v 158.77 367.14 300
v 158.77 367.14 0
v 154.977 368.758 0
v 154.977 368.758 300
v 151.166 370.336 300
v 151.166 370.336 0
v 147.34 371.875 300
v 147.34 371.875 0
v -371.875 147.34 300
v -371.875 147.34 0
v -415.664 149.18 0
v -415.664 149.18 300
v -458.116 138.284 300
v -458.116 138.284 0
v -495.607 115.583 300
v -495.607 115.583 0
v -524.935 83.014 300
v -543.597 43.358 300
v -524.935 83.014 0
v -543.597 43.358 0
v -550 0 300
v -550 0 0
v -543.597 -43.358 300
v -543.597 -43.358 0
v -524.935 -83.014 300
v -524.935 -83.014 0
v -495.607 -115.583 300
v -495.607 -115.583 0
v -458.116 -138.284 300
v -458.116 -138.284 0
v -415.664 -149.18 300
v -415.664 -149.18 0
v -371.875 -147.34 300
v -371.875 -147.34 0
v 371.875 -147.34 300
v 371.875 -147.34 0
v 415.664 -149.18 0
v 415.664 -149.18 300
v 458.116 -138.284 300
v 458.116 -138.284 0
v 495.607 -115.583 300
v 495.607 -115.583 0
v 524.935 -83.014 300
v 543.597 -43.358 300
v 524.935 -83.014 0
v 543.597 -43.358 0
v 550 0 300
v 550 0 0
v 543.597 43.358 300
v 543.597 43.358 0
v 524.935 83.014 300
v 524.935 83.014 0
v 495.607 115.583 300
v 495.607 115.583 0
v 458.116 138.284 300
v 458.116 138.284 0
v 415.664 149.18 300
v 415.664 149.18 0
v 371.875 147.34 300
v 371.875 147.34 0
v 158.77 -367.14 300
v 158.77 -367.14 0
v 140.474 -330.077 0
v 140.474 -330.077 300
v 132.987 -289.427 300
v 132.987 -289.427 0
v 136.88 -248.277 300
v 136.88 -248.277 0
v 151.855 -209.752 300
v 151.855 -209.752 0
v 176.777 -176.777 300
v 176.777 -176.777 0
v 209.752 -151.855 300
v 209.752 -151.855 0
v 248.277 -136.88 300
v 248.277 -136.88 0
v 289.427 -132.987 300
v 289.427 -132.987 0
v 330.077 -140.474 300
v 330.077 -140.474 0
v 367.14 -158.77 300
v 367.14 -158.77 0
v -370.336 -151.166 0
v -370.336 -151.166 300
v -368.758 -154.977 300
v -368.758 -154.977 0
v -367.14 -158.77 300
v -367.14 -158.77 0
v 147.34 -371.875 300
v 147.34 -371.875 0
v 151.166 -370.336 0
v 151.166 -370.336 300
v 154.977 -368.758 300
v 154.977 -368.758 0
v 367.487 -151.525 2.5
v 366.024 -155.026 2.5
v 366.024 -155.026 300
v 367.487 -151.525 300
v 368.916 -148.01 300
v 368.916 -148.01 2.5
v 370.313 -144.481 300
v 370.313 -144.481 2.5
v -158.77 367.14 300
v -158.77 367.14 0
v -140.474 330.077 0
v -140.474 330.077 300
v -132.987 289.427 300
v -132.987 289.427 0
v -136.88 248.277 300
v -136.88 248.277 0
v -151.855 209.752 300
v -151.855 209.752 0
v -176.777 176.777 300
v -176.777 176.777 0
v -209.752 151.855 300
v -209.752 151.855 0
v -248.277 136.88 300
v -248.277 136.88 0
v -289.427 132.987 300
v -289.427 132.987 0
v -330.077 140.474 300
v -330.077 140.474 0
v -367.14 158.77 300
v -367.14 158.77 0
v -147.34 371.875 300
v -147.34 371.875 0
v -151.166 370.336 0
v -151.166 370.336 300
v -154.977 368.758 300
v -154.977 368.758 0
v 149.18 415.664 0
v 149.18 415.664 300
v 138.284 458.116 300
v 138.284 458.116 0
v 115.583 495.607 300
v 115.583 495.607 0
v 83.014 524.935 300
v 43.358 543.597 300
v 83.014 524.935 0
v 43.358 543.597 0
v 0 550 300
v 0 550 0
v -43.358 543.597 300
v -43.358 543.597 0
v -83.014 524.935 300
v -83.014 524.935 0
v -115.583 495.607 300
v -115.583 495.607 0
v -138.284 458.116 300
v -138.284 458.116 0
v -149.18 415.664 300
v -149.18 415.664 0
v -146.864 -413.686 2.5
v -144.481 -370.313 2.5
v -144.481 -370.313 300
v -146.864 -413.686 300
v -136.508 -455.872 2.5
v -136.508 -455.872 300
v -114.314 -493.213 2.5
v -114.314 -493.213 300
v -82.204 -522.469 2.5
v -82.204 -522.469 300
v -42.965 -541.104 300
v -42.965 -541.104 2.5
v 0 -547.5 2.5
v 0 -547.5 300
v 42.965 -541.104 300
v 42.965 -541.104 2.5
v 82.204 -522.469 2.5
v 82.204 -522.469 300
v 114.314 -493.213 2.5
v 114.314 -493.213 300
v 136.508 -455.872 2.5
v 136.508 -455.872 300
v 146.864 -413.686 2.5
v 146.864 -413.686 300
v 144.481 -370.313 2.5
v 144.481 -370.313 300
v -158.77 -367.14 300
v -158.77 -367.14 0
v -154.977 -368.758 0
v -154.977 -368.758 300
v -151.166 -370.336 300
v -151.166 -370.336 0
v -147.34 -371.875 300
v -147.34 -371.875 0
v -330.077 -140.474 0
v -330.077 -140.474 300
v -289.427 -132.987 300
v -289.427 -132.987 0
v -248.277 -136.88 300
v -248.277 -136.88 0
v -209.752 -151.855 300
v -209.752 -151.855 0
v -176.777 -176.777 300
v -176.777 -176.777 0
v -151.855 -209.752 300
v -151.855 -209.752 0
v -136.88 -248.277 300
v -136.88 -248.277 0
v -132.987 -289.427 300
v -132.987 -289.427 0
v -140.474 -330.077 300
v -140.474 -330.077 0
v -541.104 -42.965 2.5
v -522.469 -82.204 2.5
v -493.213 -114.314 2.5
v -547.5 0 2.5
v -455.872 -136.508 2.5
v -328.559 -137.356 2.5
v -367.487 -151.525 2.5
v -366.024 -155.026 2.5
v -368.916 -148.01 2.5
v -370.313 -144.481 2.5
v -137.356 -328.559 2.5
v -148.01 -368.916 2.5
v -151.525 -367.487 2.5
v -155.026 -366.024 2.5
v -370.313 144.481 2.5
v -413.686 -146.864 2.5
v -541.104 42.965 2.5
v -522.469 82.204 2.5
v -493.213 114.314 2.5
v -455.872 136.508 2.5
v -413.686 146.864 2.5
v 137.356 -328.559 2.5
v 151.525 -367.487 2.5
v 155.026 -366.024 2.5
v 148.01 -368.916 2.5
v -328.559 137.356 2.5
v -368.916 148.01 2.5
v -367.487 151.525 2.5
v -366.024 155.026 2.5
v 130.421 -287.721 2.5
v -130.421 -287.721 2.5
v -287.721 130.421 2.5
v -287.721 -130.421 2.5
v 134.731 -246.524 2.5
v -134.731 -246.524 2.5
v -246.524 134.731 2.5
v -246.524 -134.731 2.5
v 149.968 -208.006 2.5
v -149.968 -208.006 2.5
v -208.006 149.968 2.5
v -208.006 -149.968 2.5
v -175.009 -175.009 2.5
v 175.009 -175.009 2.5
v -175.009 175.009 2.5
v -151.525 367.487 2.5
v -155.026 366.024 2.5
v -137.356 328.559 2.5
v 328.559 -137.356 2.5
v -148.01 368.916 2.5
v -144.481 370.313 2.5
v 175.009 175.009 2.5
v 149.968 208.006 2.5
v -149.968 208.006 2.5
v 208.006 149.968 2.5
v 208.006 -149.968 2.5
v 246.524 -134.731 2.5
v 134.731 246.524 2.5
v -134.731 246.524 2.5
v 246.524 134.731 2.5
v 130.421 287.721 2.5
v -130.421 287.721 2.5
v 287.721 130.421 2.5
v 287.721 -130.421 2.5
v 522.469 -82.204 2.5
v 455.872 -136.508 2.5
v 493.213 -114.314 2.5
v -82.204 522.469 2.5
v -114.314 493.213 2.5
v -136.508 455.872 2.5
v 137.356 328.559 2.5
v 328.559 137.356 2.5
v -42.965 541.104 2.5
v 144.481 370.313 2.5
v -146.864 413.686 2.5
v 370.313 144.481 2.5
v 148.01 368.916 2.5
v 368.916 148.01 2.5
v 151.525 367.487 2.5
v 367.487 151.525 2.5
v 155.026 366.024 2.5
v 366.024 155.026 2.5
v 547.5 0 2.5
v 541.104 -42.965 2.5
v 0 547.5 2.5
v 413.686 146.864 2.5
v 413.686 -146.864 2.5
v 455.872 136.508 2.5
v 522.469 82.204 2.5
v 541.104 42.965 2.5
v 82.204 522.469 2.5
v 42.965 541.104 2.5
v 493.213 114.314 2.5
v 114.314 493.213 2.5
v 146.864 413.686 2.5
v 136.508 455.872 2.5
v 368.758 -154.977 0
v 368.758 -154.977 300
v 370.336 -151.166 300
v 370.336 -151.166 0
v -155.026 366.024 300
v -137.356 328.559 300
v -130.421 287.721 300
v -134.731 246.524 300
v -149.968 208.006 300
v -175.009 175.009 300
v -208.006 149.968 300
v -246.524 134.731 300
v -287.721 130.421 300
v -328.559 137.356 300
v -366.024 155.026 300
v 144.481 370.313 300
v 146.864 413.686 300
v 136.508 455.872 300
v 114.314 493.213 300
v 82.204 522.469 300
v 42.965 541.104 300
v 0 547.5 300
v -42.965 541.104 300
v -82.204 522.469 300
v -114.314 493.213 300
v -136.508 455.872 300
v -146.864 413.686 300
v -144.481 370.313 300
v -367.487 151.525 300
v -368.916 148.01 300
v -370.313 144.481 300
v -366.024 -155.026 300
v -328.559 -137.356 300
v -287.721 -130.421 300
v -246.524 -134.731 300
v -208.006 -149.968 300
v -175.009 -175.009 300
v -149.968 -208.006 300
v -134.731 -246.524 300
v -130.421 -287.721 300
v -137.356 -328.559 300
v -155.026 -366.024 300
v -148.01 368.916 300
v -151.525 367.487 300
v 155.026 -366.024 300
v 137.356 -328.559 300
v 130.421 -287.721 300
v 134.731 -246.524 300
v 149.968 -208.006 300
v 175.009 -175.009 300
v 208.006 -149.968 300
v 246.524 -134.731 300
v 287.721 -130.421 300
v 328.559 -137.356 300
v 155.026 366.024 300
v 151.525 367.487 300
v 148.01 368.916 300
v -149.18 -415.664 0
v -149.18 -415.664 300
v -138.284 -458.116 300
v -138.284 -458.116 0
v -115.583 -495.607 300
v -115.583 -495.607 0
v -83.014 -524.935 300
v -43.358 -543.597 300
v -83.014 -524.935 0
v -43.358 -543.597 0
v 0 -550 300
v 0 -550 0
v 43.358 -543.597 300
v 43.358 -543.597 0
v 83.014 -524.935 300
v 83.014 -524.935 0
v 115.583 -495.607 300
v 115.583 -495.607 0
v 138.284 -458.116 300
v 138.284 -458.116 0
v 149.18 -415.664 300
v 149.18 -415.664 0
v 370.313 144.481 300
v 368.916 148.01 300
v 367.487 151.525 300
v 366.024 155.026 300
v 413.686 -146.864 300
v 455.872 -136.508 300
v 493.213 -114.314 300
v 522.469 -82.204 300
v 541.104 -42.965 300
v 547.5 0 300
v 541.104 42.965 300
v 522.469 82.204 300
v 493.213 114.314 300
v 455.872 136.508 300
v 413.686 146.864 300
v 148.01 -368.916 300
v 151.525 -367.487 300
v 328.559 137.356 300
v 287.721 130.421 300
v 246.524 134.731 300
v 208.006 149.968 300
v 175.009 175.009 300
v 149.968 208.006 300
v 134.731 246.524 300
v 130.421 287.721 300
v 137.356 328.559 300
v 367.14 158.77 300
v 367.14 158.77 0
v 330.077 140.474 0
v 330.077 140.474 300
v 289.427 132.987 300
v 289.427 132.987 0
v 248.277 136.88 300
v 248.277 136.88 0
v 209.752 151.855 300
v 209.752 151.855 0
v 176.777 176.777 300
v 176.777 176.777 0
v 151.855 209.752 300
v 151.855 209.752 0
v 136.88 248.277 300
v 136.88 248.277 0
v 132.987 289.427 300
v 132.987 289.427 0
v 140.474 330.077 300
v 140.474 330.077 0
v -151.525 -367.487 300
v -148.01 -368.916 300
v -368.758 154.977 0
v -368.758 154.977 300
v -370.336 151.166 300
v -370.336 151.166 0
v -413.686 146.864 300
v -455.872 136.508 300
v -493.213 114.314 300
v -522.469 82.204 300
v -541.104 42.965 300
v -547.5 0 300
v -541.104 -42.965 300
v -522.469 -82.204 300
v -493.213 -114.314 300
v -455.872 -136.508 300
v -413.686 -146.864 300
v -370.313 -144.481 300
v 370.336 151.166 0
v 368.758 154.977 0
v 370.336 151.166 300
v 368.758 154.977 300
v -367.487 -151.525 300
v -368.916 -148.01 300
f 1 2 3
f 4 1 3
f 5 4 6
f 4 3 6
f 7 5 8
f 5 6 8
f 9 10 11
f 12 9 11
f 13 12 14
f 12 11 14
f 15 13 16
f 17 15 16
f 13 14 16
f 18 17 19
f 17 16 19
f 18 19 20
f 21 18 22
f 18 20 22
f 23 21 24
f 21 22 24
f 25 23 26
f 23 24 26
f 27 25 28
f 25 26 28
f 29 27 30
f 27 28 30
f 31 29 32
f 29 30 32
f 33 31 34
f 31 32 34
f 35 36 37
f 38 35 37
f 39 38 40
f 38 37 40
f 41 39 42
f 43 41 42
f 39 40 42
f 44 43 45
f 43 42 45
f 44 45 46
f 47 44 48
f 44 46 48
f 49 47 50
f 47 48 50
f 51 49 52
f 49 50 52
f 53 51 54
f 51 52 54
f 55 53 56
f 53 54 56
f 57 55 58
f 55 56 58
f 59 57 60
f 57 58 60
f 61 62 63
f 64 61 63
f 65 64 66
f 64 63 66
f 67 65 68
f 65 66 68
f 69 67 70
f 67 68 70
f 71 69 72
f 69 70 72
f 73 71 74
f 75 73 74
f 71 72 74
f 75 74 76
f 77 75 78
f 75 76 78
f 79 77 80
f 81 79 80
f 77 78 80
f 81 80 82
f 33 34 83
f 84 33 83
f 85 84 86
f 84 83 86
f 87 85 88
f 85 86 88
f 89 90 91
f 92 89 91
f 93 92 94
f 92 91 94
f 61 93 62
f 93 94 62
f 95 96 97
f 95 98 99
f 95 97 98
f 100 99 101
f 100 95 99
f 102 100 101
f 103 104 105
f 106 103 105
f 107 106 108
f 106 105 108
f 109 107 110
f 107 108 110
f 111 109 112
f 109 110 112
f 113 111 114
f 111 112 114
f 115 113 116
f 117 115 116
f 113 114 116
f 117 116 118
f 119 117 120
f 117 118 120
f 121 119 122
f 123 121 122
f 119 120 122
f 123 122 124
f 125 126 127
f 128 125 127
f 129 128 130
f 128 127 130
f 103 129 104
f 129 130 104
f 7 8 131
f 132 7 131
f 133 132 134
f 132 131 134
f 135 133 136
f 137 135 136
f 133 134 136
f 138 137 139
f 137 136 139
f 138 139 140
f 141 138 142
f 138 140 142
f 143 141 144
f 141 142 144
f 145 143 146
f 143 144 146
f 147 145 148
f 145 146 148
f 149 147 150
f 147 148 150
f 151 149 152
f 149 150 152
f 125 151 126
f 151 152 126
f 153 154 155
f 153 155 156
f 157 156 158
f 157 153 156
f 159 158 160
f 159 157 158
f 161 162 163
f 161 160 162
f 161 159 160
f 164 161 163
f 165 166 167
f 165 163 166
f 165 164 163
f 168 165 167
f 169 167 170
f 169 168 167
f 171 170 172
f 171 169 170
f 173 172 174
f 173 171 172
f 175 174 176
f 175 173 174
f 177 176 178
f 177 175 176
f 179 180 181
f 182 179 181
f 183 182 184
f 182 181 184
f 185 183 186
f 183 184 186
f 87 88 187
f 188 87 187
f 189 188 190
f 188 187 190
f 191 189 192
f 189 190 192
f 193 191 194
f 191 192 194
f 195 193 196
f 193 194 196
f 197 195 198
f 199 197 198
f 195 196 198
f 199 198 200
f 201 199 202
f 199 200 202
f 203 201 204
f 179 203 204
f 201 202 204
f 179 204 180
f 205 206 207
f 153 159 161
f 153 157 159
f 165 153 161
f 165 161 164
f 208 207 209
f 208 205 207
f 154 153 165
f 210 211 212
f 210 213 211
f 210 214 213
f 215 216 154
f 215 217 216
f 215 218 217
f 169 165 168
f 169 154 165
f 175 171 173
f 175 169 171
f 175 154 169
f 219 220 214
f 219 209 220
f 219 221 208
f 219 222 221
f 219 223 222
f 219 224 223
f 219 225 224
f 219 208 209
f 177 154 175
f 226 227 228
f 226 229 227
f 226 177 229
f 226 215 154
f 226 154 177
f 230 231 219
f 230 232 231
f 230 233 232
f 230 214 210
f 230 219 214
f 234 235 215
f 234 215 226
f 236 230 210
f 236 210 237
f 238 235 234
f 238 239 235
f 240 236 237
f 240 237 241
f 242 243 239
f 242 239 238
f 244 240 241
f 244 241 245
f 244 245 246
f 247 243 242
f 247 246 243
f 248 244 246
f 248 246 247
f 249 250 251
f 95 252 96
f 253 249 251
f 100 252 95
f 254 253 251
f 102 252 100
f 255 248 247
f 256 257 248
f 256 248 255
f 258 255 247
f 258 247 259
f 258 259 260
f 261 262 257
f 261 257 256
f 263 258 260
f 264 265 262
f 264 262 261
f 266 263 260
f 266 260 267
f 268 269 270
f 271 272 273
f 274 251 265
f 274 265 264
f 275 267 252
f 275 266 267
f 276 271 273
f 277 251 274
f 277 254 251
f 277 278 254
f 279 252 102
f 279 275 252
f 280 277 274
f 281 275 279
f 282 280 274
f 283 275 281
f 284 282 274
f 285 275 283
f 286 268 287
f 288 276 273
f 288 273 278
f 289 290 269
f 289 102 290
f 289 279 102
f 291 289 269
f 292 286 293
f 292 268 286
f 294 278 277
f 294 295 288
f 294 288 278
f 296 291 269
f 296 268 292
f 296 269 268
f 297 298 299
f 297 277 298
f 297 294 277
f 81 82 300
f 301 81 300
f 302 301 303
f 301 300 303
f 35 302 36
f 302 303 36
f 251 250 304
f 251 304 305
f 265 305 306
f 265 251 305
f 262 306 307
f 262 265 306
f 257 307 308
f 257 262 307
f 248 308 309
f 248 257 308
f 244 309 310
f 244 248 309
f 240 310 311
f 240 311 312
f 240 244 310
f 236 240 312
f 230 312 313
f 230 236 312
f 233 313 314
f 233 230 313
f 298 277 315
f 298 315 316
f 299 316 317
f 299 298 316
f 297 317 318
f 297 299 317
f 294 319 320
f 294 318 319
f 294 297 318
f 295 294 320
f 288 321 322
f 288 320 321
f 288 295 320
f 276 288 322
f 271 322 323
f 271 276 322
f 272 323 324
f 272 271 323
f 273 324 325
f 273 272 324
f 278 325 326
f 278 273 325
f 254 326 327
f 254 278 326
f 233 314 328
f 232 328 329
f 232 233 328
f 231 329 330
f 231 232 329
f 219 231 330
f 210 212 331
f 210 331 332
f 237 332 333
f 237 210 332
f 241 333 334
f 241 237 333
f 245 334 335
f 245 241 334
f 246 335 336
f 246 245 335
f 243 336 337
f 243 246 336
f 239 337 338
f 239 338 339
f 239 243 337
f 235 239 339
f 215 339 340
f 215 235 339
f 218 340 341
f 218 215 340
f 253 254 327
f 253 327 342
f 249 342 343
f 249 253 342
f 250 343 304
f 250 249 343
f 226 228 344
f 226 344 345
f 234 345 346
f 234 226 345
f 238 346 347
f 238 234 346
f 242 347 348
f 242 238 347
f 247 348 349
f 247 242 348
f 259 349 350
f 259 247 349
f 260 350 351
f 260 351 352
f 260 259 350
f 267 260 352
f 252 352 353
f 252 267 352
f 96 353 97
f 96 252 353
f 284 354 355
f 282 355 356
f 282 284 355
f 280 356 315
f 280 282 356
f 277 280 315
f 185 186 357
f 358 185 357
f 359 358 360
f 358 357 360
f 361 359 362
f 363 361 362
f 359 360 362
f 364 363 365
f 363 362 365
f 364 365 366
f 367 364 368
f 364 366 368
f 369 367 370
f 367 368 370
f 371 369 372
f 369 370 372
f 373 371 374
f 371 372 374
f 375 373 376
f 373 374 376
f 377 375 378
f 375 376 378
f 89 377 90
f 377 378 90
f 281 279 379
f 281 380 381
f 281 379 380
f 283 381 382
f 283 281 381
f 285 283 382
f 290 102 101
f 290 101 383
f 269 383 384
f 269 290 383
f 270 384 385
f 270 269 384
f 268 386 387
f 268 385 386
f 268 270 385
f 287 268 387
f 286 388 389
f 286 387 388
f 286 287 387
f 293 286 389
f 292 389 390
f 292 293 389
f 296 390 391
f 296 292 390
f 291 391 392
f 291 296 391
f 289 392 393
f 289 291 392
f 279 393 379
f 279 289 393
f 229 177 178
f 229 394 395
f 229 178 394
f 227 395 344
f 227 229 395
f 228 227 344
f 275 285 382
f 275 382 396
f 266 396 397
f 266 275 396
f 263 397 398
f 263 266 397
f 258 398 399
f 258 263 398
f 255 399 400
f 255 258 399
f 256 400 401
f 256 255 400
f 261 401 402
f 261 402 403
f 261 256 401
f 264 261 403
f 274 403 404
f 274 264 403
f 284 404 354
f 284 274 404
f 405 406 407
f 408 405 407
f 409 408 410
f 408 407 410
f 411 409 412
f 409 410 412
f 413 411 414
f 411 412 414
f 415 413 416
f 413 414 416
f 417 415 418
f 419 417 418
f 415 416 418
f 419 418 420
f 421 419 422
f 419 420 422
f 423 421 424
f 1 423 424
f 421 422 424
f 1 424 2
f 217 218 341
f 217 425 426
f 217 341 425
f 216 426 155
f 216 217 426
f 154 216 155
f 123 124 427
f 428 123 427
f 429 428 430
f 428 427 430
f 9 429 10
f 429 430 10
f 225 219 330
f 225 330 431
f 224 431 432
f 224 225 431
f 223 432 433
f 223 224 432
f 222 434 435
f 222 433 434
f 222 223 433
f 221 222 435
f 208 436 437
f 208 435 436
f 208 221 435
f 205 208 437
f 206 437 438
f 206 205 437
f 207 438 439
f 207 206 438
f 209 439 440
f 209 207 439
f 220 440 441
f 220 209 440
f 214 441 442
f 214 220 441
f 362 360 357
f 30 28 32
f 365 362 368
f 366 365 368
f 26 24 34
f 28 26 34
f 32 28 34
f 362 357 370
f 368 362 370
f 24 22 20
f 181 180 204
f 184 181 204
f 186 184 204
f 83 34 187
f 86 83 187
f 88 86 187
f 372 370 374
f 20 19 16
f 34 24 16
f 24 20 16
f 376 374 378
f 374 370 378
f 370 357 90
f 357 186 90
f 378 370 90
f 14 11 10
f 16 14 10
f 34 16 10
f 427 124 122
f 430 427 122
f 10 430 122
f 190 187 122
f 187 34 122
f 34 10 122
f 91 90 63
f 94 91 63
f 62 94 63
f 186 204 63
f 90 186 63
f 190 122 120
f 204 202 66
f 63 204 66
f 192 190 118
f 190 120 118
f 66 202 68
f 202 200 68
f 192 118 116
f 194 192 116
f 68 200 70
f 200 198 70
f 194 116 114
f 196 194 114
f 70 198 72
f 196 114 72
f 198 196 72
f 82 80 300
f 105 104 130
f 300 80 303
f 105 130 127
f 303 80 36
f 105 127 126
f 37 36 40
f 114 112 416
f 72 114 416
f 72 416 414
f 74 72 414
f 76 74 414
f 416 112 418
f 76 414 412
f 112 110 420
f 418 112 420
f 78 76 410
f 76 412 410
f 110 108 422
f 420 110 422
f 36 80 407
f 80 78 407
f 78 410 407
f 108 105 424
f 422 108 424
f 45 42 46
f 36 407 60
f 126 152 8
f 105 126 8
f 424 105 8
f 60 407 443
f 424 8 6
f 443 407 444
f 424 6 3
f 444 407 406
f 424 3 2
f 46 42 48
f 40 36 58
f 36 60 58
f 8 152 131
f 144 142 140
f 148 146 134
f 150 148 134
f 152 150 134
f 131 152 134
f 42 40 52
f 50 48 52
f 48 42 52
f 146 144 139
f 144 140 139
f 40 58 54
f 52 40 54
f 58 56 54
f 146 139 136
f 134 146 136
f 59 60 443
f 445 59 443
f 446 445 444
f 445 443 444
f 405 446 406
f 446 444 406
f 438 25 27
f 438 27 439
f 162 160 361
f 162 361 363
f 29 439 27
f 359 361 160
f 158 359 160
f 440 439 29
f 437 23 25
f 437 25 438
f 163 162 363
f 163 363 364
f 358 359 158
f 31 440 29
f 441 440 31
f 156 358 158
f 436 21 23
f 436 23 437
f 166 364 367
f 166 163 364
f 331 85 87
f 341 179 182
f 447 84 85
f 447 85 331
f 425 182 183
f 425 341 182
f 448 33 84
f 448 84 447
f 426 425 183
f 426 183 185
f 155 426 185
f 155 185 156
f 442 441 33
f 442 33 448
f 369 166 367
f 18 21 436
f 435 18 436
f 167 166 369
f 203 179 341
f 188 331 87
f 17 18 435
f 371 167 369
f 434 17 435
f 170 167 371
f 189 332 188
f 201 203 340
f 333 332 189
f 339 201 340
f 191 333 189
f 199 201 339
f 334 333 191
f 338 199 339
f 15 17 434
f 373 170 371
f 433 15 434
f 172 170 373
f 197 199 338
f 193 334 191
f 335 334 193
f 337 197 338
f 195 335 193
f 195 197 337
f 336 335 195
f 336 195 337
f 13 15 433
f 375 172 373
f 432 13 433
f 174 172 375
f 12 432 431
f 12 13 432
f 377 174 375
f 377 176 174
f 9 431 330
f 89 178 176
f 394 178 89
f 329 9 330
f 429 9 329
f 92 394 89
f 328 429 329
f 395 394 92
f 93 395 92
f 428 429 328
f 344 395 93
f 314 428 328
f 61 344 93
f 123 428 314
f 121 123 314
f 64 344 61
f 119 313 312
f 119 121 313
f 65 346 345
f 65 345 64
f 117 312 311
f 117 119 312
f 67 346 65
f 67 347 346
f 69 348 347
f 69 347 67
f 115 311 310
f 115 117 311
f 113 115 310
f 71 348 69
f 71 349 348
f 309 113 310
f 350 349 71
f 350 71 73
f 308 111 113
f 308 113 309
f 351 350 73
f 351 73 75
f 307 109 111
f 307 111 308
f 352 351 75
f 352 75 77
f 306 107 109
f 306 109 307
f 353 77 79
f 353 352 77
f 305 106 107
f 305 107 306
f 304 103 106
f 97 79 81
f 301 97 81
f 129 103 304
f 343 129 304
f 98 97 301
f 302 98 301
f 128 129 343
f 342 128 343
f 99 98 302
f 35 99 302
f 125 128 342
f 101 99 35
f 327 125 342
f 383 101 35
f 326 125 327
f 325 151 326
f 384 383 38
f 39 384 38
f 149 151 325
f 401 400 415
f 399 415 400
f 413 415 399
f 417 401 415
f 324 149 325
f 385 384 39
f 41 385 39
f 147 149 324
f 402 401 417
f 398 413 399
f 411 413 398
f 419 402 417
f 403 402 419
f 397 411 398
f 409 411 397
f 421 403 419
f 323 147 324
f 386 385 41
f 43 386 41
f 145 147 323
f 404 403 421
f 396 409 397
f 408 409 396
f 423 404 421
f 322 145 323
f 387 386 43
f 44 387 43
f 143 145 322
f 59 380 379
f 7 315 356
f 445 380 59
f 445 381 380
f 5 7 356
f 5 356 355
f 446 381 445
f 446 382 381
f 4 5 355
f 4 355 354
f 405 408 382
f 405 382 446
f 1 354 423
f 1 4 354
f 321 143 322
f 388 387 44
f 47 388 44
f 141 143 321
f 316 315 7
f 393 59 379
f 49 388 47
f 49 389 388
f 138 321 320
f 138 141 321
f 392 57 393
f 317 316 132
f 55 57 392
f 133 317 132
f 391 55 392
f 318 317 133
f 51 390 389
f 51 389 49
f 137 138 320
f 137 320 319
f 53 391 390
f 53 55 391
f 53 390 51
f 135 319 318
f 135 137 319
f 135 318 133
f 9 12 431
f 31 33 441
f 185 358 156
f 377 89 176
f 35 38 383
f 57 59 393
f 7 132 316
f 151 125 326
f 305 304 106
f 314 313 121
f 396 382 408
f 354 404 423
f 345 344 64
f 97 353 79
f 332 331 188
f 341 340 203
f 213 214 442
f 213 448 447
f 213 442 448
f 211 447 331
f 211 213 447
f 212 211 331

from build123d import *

# Parameters (mm, degrees)
F1_DEPTH = 300
F2_T     = -2.5


with BuildPart() as f1:
    # F0 (on Top) → F1 (new body)
    with BuildSketch(Plane.XY):
        with BuildLine():
            ThreePointArc((-158.7704400152, 367.1402284923), (-176.7766952966, 176.7766952966), (-367.1402284923, 158.7704400152))
            ThreePointArc((-367.1402284923, 158.7704400152), (-369.5518130045, 153.073372946), (-371.875, 147.3396904266))
            ThreePointArc((-371.875, 147.3396904266), (-550, 0), (-371.875, -147.3396904266))
            ThreePointArc((-371.875, -147.3396904266), (-369.5518130045, -153.073372946), (-367.1402284923, -158.7704400152))
            ThreePointArc((-367.1402284923, -158.7704400152), (-176.7766952966, -176.7766952966), (-158.7704400152, -367.1402284923))
            ThreePointArc((-158.7704400152, -367.1402284923), (-153.073372946, -369.5518130045), (-147.3396904266, -371.875))
            ThreePointArc((-147.3396904266, -371.875), (0, -550), (147.3396904266, -371.875))
            ThreePointArc((147.3396904266, -371.875), (153.073372946, -369.5518130045), (158.7704400152, -367.1402284923))
            ThreePointArc((158.7704400152, -367.1402284923), (176.7766952966, -176.7766952966), (367.1402284923, -158.7704400152))
            ThreePointArc((367.1402284923, -158.7704400152), (369.5518130045, -153.073372946), (371.875, -147.3396904266))
            ThreePointArc((371.875, -147.3396904266), (550, 0), (371.875, 147.3396904266))
            ThreePointArc((371.875, 147.3396904266), (369.5518130045, 153.073372946), (367.1402284923, 158.7704400152))
            ThreePointArc((367.1402284923, 158.7704400152), (176.7766952966, 176.7766952966), (158.7704400152, 367.1402284923))
            ThreePointArc((158.7704400152, 367.1402284923), (153.073372946, 369.5518130045), (147.3396904266, 371.875))
            ThreePointArc((147.3396904266, 371.875), (0, 550), (-147.3396904266, 371.875))
            ThreePointArc((-147.3396904266, 371.875), (-153.073372946, 369.5518130045), (-158.7704400152, 367.1402284923))
        make_face()
    extrude(amount=F1_DEPTH)

    # F2
    f2_openings = [f1.faces().sort_by_distance(p)[0] for p in [
        (0, 0, 300),
    ]]
    offset(amount=F2_T, openings=f2_openings, kind=Kind.INTERSECTION)


solid = f1.part
